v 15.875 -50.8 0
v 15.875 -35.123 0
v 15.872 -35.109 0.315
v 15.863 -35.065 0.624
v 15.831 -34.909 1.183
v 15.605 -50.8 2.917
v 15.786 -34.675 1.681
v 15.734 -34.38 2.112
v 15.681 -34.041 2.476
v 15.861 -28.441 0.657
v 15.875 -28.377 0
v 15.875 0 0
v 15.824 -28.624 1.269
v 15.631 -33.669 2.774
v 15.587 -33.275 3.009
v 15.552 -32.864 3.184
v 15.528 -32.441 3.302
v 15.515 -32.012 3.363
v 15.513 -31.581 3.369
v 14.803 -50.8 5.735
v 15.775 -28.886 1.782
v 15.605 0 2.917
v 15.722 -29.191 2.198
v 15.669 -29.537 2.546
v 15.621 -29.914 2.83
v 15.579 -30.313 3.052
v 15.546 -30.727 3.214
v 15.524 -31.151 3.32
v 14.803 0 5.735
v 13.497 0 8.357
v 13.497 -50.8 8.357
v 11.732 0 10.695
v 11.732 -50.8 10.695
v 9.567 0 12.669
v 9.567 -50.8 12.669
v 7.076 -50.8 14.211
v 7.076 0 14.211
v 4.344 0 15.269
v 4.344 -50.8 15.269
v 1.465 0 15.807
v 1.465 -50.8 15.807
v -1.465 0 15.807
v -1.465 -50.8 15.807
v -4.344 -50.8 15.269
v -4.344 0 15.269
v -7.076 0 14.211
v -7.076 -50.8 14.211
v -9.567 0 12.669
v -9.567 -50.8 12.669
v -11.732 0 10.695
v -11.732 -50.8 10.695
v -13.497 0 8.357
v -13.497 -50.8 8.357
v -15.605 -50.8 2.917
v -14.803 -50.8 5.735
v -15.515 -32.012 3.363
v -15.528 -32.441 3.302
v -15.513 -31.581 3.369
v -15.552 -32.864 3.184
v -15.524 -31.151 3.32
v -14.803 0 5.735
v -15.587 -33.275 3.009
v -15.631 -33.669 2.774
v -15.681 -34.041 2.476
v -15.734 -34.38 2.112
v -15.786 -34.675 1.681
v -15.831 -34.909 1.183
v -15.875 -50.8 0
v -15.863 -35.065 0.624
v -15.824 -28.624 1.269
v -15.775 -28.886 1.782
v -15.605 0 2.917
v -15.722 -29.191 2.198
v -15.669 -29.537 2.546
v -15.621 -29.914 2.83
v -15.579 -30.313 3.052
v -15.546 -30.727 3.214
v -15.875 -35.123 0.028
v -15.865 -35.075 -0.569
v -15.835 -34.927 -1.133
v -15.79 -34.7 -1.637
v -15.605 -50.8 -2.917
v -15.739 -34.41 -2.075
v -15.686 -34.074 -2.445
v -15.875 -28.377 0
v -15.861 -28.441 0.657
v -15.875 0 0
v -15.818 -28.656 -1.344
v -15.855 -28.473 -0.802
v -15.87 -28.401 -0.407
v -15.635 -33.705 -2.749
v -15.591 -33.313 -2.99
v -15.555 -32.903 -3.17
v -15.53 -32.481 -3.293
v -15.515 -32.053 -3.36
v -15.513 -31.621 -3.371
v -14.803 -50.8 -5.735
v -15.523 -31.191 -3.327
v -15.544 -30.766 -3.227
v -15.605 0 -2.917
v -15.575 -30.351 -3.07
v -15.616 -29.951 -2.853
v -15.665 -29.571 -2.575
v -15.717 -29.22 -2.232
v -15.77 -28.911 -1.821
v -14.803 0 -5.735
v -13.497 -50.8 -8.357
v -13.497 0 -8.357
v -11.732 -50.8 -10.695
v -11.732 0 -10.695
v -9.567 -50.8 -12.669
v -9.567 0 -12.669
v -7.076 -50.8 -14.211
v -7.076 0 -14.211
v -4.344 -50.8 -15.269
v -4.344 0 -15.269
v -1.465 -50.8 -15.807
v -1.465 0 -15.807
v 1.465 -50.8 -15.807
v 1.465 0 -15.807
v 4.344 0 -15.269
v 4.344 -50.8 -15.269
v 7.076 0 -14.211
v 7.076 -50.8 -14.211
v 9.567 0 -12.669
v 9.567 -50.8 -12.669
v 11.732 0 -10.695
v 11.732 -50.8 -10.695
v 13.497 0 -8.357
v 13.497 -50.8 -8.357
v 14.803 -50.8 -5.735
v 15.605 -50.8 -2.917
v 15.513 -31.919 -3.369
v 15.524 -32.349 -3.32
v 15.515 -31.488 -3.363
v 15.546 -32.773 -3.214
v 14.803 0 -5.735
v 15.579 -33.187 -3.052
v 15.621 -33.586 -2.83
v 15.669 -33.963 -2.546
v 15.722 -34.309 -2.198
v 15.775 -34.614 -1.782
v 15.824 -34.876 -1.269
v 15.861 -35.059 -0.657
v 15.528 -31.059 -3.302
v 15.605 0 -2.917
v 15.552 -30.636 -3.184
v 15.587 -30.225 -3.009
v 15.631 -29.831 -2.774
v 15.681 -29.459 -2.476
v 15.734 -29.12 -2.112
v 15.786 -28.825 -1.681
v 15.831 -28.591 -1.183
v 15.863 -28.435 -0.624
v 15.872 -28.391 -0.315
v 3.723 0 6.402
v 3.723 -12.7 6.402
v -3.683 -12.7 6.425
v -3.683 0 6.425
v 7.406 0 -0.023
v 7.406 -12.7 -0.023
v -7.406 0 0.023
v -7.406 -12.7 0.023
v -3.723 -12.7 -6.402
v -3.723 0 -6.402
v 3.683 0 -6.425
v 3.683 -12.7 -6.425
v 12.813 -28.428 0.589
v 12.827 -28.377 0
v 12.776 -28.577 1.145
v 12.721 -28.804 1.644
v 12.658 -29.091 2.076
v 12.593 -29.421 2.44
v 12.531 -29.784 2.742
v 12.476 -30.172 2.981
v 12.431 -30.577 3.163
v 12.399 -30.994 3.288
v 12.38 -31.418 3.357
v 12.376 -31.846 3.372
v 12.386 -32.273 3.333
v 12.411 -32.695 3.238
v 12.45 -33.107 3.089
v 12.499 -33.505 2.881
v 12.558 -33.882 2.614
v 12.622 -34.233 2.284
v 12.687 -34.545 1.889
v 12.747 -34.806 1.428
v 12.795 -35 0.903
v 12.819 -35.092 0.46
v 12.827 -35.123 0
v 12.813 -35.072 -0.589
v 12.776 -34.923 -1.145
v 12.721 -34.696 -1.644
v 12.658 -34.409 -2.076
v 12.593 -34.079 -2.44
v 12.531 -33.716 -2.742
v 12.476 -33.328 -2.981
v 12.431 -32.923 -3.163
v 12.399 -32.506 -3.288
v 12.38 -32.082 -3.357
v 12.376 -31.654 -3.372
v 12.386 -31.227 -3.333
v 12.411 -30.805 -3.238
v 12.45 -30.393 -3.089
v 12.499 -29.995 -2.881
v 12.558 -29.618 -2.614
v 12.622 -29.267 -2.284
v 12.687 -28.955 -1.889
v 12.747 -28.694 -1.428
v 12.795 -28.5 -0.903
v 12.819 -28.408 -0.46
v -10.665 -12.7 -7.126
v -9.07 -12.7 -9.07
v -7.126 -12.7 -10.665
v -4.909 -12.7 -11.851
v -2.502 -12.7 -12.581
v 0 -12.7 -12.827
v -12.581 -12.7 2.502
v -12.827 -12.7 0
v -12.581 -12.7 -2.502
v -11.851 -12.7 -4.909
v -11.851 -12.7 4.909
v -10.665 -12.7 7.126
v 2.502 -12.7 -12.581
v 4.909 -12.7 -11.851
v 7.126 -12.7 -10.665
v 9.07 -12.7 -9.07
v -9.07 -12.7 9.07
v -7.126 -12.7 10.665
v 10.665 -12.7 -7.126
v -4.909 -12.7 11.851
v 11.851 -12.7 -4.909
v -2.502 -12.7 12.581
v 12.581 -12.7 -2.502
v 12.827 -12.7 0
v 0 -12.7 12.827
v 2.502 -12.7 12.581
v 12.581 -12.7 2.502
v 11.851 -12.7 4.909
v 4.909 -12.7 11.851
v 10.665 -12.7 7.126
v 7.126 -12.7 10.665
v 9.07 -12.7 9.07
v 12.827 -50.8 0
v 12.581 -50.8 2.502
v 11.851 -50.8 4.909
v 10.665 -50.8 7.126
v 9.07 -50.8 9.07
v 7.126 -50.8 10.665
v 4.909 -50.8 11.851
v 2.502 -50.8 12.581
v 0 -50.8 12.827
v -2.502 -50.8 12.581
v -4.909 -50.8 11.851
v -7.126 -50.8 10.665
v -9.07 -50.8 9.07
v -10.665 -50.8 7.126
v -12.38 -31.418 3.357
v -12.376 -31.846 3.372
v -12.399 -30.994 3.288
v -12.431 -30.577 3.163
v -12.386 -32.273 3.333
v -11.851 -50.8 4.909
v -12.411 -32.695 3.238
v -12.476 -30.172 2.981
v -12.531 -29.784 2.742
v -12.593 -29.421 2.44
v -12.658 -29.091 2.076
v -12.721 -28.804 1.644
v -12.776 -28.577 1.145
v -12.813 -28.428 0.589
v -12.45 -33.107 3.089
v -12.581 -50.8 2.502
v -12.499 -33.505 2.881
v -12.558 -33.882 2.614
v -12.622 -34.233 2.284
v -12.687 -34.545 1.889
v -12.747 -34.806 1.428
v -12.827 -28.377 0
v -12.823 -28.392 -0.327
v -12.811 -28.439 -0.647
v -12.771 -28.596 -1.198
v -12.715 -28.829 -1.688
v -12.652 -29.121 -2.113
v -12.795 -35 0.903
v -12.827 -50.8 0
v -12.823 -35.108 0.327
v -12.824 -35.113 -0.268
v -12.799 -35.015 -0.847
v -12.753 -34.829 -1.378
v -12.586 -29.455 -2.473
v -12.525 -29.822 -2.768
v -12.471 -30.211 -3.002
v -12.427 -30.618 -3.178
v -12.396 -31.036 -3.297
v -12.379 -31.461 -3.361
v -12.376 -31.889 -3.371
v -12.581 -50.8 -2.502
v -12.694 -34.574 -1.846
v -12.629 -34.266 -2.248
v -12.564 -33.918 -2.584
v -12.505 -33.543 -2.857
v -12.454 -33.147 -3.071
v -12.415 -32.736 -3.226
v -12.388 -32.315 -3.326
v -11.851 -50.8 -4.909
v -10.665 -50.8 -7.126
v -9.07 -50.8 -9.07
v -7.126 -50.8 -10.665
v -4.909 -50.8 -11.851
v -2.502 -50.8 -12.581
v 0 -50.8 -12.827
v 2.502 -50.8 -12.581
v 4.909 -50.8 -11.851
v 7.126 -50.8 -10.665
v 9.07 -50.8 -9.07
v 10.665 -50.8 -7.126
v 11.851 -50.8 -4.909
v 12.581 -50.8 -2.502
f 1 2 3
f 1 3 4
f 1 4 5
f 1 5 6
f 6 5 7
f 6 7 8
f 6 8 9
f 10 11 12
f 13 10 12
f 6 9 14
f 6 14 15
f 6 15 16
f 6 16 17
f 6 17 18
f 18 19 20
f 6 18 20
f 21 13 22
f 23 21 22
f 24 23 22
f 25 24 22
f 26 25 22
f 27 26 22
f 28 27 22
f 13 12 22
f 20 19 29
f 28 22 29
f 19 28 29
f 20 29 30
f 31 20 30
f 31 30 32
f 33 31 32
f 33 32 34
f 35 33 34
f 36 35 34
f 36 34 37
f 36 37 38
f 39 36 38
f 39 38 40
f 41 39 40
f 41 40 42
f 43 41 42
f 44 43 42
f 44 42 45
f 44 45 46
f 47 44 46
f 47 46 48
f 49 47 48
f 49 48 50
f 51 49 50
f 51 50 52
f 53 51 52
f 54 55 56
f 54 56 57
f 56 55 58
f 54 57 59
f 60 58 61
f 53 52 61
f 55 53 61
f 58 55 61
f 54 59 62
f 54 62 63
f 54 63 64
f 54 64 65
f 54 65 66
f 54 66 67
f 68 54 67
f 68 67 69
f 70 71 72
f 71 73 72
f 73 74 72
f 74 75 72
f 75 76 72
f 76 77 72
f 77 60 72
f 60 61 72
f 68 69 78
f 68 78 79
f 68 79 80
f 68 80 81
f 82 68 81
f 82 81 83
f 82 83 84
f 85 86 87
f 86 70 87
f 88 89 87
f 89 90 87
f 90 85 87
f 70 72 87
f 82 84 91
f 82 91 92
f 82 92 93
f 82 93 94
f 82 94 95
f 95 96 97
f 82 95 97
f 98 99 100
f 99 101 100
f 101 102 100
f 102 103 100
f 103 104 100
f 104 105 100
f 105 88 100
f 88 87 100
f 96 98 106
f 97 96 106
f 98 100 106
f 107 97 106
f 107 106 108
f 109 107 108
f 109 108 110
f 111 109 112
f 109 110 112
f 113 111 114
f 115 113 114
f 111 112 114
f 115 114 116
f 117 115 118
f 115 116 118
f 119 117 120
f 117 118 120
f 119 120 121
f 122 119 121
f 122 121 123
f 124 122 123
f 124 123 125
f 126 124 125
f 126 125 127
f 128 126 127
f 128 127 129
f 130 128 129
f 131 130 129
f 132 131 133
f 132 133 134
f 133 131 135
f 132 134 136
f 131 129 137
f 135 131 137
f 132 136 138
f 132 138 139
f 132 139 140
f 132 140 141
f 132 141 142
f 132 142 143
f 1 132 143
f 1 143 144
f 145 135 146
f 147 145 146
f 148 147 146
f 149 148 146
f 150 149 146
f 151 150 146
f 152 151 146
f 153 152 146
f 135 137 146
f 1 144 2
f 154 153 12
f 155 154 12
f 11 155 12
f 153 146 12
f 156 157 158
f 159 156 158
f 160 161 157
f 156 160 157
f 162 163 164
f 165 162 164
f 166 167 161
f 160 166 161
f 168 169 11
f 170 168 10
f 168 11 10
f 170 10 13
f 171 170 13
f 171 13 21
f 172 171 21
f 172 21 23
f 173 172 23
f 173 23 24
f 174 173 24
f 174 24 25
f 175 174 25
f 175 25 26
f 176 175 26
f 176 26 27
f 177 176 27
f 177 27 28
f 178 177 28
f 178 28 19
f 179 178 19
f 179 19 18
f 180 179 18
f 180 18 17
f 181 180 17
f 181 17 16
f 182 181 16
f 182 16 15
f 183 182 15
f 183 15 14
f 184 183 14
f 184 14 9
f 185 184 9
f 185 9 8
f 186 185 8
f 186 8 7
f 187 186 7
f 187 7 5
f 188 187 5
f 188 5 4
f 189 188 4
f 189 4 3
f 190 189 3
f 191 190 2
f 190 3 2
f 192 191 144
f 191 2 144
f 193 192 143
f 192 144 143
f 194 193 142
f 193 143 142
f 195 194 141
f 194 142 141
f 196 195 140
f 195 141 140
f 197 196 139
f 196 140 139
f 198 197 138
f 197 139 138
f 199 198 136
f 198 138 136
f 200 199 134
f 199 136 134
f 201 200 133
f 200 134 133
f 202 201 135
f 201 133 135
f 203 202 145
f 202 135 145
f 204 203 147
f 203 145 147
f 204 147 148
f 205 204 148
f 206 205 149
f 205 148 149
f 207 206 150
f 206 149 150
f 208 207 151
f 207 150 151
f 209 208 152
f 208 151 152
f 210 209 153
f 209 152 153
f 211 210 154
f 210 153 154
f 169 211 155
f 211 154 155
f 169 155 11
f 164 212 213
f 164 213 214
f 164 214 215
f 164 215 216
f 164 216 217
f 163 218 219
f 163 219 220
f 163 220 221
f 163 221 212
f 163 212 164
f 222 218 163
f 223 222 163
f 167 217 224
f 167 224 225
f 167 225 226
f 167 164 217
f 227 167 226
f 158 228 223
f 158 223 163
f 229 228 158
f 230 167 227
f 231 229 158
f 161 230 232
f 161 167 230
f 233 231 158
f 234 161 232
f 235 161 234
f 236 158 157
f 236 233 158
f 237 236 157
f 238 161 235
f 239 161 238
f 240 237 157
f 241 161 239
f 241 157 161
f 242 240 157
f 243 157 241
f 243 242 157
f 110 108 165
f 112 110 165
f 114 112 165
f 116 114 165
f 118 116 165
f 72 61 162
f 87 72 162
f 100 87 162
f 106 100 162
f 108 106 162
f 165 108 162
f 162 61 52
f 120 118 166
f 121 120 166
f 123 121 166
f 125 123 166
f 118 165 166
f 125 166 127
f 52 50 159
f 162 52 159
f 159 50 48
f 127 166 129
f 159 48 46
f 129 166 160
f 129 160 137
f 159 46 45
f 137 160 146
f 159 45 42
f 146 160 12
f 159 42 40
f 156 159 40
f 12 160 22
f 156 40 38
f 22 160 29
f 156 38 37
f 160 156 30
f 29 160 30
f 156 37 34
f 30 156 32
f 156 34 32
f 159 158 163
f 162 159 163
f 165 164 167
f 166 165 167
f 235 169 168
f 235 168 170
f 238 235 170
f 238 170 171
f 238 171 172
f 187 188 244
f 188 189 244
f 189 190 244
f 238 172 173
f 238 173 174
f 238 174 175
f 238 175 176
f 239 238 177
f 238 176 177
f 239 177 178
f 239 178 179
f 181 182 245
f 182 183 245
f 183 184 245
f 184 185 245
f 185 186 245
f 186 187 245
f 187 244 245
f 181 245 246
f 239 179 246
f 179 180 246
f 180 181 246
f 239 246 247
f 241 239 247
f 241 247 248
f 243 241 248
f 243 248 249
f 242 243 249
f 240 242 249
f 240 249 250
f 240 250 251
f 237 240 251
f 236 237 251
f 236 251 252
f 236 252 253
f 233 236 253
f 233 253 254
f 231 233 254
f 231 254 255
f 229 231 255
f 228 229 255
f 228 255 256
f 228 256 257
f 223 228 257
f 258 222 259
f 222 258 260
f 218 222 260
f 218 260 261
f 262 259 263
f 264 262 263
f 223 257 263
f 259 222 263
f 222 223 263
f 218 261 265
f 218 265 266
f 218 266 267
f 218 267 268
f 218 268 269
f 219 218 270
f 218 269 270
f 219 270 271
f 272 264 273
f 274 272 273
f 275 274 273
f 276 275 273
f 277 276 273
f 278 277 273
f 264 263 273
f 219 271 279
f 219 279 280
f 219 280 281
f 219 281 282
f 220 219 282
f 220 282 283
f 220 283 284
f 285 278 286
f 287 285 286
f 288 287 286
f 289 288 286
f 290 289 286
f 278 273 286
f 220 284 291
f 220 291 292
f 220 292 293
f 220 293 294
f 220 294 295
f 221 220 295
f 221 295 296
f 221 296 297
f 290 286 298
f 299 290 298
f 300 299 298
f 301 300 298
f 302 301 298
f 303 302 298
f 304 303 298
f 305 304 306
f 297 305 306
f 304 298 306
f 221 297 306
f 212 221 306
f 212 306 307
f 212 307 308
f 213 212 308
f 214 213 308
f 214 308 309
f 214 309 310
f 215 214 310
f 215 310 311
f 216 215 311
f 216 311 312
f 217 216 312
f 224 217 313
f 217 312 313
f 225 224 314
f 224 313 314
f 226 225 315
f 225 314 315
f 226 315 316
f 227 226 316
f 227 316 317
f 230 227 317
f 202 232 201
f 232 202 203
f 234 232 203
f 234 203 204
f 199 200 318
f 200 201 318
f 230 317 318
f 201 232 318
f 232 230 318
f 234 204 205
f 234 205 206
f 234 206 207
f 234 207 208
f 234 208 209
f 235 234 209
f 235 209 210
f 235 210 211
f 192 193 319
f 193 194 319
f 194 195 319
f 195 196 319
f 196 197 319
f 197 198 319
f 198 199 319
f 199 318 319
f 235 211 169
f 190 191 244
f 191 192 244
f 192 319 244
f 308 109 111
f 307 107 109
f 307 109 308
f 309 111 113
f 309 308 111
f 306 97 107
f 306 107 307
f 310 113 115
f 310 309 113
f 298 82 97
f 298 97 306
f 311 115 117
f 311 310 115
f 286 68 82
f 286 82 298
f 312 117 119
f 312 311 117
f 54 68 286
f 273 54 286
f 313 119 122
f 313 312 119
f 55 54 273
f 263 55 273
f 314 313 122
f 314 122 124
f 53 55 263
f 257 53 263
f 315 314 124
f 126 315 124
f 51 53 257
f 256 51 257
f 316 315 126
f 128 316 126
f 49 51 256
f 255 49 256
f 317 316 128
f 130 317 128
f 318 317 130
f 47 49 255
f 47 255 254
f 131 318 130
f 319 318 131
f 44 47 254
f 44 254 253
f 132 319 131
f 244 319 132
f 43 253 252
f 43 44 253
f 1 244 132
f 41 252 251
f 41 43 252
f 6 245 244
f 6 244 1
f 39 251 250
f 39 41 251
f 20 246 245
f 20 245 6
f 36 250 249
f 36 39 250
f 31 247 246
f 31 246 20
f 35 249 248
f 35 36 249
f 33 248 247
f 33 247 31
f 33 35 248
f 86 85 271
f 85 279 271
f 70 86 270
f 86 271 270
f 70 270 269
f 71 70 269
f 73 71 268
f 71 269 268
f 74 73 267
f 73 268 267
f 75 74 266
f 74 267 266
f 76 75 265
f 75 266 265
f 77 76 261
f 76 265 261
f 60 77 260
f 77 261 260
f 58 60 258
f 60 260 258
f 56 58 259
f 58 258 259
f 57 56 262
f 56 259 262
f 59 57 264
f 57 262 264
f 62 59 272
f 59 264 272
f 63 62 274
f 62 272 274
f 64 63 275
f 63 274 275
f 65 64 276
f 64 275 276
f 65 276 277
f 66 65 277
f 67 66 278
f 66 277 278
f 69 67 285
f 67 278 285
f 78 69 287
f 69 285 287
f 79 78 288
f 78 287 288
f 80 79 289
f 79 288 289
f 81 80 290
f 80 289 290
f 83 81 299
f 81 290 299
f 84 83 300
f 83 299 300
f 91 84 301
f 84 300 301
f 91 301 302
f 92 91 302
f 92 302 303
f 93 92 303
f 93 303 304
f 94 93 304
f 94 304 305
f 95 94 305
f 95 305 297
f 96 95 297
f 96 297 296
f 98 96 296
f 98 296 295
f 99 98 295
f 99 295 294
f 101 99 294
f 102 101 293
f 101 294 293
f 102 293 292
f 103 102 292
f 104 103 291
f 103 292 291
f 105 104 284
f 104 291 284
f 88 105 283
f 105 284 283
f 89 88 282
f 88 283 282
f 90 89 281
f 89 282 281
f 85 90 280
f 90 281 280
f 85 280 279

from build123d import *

# Parameters (mm, degrees)
F0_R     = 15.875
F1_DEPTH = 50.8
F2_R     = 12.827
F3_DEPTH = 38.1
F5_DEPTH = 12.7
F6_R     = 3.373438
F7_DEPTH = 15.875


with BuildPart() as f1:
    # F0 (on Front) → F1 (new body)
    with BuildSketch(Plane.XZ):
        Circle(F0_R)
    extrude(amount=F1_DEPTH)

    # F2 (on face) → F3 (cut)
    with BuildSketch(Plane.XZ.offset(50.8)):
        Circle(F2_R)
    extrude(amount=-F3_DEPTH, mode=Mode.SUBTRACT)

    # F4 (on face) → F5 (cut)
    with BuildSketch(Plane.XZ.offset(12.7)):
        Polygon((7.405636, -0.023035), (3.722767, 6.401951), (-3.682869, 6.424986), (-7.405636, 0.023035), (-3.722767, -6.401951), (3.682869, -6.424986), align=None)
    extrude(amount=-F5_DEPTH, mode=Mode.SUBTRACT)

    # F6 (on Right) → F7 (cut, symmetric)
    with BuildSketch(Plane.YZ):
        with Locations((-31.75, 0)):
            Circle(F6_R)
    extrude(amount=F7_DEPTH, both=True, mode=Mode.SUBTRACT)


solid = f1.part
